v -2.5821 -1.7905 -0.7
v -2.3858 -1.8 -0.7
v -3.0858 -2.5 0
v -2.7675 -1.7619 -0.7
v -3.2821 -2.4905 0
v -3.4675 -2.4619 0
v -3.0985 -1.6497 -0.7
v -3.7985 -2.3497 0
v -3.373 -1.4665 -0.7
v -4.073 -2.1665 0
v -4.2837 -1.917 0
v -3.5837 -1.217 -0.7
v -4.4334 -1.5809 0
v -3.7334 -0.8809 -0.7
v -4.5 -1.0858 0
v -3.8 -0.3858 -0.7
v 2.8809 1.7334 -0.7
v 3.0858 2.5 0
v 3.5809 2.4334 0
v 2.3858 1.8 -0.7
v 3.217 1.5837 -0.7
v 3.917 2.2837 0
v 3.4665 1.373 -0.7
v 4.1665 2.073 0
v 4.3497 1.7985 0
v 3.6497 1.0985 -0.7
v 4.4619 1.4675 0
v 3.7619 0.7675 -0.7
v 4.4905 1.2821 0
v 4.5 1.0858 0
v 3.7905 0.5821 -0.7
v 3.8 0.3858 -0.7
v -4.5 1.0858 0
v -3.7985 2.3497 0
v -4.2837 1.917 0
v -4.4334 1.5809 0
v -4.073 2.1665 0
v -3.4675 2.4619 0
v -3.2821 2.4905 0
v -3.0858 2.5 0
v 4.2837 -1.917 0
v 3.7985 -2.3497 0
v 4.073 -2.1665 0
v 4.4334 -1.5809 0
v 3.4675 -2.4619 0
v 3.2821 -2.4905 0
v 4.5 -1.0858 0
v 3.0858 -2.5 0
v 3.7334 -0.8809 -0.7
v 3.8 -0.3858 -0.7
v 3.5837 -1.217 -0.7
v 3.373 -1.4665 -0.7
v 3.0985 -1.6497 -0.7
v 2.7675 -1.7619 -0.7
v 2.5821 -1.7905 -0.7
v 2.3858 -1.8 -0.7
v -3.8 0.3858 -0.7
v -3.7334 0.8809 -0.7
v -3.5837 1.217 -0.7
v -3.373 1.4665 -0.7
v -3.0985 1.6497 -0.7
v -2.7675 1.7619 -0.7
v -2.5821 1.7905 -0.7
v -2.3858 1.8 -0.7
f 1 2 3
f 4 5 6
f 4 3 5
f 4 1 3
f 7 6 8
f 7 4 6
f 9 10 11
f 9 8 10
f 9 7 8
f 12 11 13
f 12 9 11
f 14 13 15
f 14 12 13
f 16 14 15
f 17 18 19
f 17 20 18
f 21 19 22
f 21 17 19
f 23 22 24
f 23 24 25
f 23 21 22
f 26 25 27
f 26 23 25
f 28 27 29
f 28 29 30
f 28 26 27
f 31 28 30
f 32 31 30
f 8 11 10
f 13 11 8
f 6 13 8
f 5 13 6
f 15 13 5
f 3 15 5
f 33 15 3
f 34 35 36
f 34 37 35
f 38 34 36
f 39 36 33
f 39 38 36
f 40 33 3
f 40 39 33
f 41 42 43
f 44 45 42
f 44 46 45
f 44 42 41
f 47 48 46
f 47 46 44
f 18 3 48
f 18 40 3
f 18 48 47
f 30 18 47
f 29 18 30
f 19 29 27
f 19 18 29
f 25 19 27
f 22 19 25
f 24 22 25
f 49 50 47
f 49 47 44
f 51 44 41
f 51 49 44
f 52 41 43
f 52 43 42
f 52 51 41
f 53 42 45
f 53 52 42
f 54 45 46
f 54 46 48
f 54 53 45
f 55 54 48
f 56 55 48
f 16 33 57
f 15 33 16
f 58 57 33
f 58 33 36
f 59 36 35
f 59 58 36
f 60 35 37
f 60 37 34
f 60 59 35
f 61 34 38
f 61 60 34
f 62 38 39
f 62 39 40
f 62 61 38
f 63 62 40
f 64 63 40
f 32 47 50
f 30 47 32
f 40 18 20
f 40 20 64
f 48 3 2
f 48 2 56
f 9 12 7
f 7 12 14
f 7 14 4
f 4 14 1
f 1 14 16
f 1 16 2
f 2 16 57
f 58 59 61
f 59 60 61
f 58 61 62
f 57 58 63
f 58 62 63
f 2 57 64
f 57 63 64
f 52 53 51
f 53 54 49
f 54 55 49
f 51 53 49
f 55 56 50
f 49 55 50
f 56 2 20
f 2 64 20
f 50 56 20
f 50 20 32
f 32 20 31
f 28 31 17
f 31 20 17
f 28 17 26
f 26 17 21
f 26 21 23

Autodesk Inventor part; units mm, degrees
ref_plane "YZ Plane" through (0, 0, 0) normal (1, 0, 0) x (0, 1, 0)
ref_plane "XZ Plane" through (0, 0, 0) normal (0, 1, 0) x (-1, 0, 0)
ref_plane "XY Plane" through (0, 0, 0) normal (0, 0, 1) x (1, 0, 0)
sketch "Sketch1" plane through (0, 0, 0) normal (0, 0, 1) x (1, 0, 0)
  line L0 (-4.5, -2.5) -> (4.5, -2.5)
  line L1 (4.5, -2.5) -> (4.5, 2.5)
  line L2 (4.5, 2.5) -> (-4.5, 2.5)
  line L3 (-4.5, 2.5) -> (-4.5, -2.5)
  line L4 (-4.5, -2.5) -> (4.5, 2.5) construction
  line L5 (4.5, -2.5) -> (-4.5, 2.5) construction
  point P0 (0, 0)
  dimension "d0" = 9
  dimension "d1" = 5
extrude "Extrusion1" add sketch "Sketch1" against normal blind 0.7 draft -45
fillet "Fillet1" radius 2 4 edges at (-4.15, -2.15, -0.35) (-4.15, 2.15, -0.35) (4.15, -2.15, -0.35) (4.15, 2.15, -0.35)
properties part number "Base"
